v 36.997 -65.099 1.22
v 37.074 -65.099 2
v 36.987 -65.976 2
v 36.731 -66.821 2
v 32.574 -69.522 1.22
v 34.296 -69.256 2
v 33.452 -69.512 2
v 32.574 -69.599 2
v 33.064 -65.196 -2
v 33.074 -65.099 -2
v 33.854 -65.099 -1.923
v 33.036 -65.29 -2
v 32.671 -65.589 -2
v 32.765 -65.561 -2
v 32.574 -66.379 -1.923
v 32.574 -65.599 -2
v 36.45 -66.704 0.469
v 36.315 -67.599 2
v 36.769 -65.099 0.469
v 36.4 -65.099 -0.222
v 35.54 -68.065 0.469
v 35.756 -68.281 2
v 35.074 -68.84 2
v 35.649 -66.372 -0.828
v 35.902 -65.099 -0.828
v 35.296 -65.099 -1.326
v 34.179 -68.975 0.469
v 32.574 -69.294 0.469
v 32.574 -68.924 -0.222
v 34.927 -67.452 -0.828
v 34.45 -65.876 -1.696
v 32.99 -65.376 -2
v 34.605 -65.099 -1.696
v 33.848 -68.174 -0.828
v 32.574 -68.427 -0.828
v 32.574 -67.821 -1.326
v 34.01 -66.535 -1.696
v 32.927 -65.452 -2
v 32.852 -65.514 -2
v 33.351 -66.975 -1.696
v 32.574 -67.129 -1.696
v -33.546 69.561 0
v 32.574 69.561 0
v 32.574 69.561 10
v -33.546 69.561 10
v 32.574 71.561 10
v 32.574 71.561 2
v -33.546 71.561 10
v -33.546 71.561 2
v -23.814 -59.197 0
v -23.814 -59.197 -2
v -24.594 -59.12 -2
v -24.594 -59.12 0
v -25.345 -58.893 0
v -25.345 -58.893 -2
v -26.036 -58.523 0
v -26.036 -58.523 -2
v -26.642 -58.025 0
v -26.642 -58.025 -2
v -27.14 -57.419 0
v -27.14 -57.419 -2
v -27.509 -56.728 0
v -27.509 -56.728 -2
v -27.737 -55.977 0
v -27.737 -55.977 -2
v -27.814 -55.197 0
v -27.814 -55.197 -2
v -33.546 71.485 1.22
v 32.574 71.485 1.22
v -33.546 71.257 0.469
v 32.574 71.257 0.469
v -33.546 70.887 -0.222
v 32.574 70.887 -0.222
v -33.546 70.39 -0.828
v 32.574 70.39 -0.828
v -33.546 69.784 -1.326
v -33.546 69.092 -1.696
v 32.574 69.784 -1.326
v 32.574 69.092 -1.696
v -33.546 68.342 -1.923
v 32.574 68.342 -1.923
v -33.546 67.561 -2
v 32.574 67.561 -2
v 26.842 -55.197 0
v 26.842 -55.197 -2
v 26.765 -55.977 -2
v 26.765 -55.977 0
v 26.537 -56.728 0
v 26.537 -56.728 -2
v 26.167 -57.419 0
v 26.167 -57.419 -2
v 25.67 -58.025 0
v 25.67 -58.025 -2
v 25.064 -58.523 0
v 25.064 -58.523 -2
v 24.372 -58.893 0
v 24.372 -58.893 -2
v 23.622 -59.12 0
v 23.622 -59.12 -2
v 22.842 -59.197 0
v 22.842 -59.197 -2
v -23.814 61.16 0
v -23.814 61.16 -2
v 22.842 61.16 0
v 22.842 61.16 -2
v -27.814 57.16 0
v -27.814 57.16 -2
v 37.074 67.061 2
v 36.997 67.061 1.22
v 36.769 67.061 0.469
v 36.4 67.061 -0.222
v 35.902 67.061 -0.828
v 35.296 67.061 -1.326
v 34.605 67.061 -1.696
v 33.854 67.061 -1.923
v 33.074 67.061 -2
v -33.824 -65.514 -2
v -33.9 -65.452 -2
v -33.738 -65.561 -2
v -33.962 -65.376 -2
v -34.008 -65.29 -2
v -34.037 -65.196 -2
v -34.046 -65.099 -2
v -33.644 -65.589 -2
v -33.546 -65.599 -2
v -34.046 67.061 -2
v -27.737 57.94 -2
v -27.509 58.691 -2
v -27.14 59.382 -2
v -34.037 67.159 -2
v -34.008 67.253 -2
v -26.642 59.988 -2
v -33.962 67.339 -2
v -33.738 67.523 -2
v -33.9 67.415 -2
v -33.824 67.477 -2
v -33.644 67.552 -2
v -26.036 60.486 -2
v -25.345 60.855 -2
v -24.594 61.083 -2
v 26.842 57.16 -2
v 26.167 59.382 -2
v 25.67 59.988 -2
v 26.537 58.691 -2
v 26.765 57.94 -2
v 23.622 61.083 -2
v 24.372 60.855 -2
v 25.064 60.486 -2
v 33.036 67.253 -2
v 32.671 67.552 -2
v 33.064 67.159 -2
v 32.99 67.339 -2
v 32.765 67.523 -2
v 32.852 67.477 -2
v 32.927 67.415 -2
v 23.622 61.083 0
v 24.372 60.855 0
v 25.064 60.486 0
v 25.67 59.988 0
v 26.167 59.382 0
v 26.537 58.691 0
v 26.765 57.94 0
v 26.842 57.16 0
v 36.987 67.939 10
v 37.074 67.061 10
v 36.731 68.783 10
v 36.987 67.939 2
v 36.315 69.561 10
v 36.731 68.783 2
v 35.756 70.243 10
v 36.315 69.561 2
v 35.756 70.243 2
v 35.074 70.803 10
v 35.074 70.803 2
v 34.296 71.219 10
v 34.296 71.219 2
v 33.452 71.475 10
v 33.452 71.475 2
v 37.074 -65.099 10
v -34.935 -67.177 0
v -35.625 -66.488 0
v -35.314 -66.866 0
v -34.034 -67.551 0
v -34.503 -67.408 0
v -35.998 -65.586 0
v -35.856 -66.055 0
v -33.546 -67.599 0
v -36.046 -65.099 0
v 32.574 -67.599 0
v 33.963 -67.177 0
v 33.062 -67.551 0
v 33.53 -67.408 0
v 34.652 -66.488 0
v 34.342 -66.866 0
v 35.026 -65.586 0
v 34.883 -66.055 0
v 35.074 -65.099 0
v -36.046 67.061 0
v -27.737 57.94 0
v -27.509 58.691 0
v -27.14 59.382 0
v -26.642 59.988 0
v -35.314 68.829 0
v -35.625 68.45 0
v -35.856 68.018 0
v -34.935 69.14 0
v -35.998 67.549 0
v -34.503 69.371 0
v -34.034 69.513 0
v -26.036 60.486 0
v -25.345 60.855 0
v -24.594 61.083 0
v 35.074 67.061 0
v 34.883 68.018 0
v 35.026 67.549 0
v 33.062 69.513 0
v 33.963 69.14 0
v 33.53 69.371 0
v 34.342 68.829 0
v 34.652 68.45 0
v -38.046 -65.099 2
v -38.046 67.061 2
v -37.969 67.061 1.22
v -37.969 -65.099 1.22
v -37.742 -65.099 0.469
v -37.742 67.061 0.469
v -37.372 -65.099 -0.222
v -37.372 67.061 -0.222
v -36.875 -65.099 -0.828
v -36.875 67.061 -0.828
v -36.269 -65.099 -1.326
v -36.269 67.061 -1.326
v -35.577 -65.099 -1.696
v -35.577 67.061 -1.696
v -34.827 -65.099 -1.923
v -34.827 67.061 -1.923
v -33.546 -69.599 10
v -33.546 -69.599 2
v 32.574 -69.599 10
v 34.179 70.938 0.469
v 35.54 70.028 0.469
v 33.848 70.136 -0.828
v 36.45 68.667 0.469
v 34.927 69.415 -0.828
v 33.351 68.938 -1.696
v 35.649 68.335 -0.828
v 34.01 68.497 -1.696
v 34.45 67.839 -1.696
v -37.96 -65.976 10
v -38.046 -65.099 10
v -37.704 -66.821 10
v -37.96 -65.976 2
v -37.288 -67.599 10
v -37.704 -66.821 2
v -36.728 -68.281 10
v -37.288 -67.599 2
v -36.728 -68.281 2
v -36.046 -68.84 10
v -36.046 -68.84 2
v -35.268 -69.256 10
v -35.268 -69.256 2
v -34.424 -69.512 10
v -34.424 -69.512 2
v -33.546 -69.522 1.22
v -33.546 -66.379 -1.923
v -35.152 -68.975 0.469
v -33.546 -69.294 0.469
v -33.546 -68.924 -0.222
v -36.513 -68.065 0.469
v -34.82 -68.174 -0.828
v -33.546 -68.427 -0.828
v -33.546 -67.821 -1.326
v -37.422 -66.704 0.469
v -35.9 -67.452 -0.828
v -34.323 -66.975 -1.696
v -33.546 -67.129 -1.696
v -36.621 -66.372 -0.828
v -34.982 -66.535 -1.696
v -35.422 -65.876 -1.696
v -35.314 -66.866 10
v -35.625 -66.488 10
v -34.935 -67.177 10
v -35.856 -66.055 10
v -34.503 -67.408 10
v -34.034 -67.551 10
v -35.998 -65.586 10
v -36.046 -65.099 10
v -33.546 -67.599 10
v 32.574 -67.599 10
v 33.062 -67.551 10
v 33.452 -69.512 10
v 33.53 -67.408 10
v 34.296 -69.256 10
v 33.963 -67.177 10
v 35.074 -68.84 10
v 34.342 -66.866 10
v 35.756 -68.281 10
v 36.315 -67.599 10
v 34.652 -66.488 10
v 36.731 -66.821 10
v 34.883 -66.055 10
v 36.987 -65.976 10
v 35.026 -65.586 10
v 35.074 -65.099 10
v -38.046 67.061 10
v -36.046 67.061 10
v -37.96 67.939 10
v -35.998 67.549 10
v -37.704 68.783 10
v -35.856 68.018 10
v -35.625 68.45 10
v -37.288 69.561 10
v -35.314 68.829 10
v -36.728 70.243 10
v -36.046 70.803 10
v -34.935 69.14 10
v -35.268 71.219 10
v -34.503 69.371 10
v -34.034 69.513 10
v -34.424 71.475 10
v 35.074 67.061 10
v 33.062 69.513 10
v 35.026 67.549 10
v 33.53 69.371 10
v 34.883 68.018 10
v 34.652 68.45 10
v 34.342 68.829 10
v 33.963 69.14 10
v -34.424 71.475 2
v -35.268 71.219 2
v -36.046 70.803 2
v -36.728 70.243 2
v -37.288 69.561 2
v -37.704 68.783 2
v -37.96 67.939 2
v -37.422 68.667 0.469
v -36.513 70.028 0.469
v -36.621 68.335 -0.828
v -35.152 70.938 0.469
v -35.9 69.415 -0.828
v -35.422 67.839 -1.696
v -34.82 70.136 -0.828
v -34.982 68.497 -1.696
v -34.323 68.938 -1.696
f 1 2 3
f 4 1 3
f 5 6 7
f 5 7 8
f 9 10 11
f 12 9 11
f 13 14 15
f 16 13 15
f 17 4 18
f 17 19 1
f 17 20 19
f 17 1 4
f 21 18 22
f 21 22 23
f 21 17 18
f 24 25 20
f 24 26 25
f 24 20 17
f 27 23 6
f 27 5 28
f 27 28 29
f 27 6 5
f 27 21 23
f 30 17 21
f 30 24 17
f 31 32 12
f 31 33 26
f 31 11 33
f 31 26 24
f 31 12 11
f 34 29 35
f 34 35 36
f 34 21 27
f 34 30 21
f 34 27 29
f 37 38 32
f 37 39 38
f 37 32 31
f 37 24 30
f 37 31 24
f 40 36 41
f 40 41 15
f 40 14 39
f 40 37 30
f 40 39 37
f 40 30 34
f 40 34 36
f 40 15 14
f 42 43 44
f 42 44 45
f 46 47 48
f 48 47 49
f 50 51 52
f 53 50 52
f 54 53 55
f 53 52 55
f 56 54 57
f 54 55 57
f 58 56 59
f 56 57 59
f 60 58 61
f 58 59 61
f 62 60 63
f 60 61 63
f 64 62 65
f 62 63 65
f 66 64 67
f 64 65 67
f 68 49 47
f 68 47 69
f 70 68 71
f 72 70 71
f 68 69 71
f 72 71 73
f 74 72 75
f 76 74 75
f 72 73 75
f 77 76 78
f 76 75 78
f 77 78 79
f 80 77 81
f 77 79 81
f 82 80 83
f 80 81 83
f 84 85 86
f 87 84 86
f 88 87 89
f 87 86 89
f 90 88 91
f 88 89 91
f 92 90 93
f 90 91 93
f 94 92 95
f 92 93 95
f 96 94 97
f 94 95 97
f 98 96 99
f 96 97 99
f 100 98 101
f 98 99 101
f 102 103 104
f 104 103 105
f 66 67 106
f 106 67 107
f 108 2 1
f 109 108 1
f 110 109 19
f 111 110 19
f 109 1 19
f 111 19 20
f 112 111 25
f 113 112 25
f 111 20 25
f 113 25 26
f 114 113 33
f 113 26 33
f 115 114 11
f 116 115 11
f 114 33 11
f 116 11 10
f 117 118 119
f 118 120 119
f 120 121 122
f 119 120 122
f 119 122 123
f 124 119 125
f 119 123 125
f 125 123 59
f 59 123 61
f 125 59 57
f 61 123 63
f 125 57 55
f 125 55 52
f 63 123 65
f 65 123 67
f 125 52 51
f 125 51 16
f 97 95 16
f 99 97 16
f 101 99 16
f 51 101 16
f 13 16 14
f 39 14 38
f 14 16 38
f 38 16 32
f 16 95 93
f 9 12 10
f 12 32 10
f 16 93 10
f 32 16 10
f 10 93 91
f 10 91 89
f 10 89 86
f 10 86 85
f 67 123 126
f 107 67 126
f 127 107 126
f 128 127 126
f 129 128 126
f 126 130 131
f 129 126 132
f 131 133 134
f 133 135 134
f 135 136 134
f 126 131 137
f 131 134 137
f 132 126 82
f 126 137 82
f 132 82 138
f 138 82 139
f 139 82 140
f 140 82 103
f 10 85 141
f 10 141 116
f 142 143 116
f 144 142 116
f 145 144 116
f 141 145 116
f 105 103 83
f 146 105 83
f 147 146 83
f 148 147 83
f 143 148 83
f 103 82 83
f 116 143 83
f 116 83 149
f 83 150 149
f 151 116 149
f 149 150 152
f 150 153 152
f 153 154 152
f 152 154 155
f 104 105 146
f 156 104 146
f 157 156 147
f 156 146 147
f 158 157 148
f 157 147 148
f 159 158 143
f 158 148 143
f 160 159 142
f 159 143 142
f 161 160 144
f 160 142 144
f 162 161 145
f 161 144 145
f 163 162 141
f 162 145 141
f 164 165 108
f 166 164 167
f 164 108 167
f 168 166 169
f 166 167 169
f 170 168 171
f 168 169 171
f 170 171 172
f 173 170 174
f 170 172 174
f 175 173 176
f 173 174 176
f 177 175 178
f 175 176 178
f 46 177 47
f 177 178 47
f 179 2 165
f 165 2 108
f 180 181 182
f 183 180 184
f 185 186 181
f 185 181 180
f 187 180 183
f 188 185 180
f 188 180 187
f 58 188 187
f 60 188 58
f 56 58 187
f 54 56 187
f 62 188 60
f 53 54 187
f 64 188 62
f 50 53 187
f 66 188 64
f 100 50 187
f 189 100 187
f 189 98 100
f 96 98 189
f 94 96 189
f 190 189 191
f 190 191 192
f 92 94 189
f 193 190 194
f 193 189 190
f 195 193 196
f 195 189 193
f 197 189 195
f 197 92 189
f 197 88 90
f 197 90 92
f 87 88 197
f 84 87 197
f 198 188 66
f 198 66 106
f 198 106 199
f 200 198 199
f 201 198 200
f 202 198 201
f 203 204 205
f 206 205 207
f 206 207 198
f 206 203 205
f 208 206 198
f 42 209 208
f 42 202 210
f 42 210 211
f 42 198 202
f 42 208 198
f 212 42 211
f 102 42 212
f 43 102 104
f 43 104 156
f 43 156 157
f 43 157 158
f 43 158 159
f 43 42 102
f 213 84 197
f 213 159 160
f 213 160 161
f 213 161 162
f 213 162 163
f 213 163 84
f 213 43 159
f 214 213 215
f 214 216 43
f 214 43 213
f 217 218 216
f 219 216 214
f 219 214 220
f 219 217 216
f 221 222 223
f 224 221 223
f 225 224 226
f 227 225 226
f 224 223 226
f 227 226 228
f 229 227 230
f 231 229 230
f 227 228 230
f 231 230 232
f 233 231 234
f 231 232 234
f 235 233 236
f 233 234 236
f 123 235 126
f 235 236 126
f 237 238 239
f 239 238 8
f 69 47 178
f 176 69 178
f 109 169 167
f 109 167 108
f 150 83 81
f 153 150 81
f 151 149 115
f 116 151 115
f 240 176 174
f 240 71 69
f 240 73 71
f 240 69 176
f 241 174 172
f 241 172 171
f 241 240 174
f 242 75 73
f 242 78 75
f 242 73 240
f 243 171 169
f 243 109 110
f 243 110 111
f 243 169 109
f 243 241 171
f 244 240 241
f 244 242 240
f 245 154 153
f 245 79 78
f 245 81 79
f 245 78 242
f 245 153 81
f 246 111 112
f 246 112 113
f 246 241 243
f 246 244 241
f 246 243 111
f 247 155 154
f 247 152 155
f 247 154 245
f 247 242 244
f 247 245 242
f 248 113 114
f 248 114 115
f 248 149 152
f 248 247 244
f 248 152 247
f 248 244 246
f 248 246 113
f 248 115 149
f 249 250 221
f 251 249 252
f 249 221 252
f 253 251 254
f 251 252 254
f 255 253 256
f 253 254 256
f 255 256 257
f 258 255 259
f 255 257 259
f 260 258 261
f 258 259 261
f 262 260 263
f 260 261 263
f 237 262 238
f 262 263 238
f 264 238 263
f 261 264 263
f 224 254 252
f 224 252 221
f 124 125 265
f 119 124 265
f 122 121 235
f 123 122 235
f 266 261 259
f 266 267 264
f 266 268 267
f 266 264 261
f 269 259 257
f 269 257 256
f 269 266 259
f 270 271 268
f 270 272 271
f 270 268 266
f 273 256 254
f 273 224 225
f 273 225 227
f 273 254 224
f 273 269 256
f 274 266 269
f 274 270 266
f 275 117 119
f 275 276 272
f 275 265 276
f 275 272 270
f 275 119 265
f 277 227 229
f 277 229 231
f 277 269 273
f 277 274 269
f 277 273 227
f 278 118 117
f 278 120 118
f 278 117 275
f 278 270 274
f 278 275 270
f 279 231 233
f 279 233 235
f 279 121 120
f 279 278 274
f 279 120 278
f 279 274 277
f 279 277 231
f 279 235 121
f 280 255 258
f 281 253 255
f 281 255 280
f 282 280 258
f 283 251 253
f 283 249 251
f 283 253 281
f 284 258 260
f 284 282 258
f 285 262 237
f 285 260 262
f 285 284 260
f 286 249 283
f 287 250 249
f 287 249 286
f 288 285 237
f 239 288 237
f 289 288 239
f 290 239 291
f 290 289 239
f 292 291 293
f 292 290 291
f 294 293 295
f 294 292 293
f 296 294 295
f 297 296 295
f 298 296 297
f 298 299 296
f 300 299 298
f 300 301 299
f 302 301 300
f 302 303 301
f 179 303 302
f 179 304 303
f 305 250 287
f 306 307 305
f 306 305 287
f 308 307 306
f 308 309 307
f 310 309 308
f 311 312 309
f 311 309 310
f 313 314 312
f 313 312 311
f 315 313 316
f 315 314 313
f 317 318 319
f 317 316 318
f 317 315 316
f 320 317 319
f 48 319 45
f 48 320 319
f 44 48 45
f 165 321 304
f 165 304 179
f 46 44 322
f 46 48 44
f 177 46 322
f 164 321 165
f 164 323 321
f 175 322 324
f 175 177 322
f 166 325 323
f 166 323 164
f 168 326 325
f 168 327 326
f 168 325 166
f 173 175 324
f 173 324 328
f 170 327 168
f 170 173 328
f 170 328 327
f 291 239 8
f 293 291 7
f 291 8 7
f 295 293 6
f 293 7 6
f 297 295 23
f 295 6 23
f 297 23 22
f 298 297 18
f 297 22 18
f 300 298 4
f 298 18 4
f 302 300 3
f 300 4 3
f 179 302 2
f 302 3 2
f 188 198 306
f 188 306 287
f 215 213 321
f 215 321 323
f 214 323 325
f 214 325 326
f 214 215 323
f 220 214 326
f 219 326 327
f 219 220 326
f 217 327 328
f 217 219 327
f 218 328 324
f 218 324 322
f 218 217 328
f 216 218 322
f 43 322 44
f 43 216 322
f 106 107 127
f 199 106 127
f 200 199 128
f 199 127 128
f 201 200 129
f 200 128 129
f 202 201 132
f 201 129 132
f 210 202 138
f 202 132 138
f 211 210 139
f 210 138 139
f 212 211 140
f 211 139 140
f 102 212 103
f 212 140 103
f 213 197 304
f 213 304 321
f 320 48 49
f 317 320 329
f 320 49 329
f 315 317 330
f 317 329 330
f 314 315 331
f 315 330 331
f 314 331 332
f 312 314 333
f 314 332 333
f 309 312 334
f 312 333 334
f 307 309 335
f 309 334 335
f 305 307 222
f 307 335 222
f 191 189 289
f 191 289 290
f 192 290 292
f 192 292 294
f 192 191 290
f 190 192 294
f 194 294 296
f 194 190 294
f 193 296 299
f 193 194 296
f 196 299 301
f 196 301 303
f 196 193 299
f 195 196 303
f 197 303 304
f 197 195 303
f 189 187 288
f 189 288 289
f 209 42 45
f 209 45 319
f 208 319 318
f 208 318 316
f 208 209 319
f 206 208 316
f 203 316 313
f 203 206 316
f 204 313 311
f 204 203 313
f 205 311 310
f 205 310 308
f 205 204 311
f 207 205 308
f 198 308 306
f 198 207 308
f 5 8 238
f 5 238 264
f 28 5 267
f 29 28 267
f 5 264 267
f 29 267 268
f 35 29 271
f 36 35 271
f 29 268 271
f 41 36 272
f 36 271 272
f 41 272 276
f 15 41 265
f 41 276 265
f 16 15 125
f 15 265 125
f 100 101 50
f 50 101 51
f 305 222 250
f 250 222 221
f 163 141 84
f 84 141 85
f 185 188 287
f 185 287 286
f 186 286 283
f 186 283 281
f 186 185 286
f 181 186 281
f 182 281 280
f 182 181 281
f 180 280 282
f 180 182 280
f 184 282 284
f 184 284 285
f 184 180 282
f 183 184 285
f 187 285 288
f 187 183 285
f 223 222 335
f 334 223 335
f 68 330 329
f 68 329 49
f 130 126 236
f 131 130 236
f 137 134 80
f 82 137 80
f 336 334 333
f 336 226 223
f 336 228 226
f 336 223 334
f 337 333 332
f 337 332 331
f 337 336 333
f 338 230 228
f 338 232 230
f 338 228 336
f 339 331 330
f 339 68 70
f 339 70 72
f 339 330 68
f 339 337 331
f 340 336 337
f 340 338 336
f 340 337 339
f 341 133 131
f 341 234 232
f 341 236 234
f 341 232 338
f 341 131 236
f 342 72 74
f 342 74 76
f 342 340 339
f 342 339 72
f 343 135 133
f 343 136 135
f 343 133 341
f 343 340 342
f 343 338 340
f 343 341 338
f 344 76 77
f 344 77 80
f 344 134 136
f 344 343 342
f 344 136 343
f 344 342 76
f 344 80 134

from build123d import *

# Parameters (mm, degrees)
BOSS_EXTRU_1_DEPTH      = 10
COQUE1_T                = 2
CONG_1_R                = 4
ENL_V_MAT_EXTRU_1_DEPTH = 10


with BuildPart() as part:
    # Esquisse1 → Boss.-Extru.1 (new body)
    with BuildSketch(Plane.XY):
        with BuildLine():
            Line((-33.546223224, -67.598576794), (32.573776776, -67.598576794))
            ThreePointArc((32.573776776, -67.598576794), (34.341543729, -66.866343747), (35.073776776, -65.098576794))
            Line((35.073776776, -65.098576794), (35.073776776, 67.061423206))
            ThreePointArc((35.073776776, 67.061423206), (34.341543729, 68.829190159), (32.573776776, 69.561423206))
            Line((32.573776776, 69.561423206), (-33.546223224, 69.561423206))
            ThreePointArc((-33.546223224, 69.561423206), (-35.313990177, 68.829190159), (-36.046223224, 67.061423206))
            Line((-36.046223224, 67.061423206), (-36.046223224, -65.098576794))
            ThreePointArc((-36.046223224, -65.098576794), (-35.313990177, -66.866343747), (-33.546223224, -67.598576794))
        make_face()
    extrude(amount=BOSS_EXTRU_1_DEPTH)

    # Coque1
    coque1_openings = [part.faces().sort_by_distance(p)[0] for p in [
        (-0.486223224, 0.981423206, 10),
    ]]
    offset(amount=COQUE1_T, openings=coque1_openings, kind=Kind.INTERSECTION)

    # Congé1
    # the kernel refuses this fillet: 4 mm, written as the material it takes off along each edge
    with BuildSketch(Plane(origin=(32.573776776, 71.561423206, -2), x_dir=(0, 0, 1), z_dir=(-1, 0, 0)), Plane(origin=(-33.546223224, -69.598576794, -2), x_dir=(0, 0, 1), z_dir=(1, 0, 0))) as cong_1_piece_1:
        with BuildLine():
            CenterArc((CONG_1_R, -CONG_1_R), CONG_1_R, 90, 90)
            Line((0, -CONG_1_R), (0, 0))
            Line((0, 0), (CONG_1_R, 0))
        make_face()
    extrude(amount=66.12, mode=Mode.SUBTRACT)
    with BuildSketch(Plane(origin=(32.573776776, 67.061423206, -2), x_dir=(0, 1, 0), z_dir=(-1, 0, 0))) as cong_1_piece_2:
        with BuildLine():
            CenterArc((4.5 - CONG_1_R, -CONG_1_R), CONG_1_R, 0, 90)
            Line((4.5 - CONG_1_R, 0), (4.5, 0))
            Line((4.5, 0), (4.5, -CONG_1_R))
        make_face()
    revolve(axis=Axis((32.573776776, 67.061423206, -2), (0, 0, -1)), revolution_arc=90, mode=Mode.SUBTRACT)
    with BuildSketch(Plane(origin=(37.073776776, -65.098576794, -2), x_dir=(0, 0, 1), z_dir=(0, 1, 0)), Plane(origin=(-38.046223224, 67.061423206, -2), x_dir=(0, 0, 1), z_dir=(0, -1, 0))) as cong_1_piece_3:
        with BuildLine():
            CenterArc((CONG_1_R, -CONG_1_R), CONG_1_R, 90, 90)
            Line((0, -CONG_1_R), (0, 0))
            Line((0, 0), (CONG_1_R, 0))
        make_face()
    extrude(amount=132.16, mode=Mode.SUBTRACT)
    with BuildSketch(Plane(origin=(32.573776776, -65.098576794, -2), x_dir=(1, 0, 0), z_dir=(0, 1, 0))) as cong_1_piece_4:
        with BuildLine():
            CenterArc((4.5 - CONG_1_R, -CONG_1_R), CONG_1_R, 0, 90)
            Line((4.5 - CONG_1_R, 0), (4.5, 0))
            Line((4.5, 0), (4.5, -CONG_1_R))
        make_face()
    revolve(axis=Axis((32.573776776, -65.098576794, -2), (0, 0, -1)), revolution_arc=90, mode=Mode.SUBTRACT)
    with BuildSketch(Plane(origin=(-33.546223224, -65.098576794, -2), x_dir=(0, -1, 0), z_dir=(1, 0, 0))) as cong_1_piece_5:
        with BuildLine():
            CenterArc((4.5 - CONG_1_R, -CONG_1_R), CONG_1_R, 0, 90)
            Line((4.5 - CONG_1_R, 0), (4.5, 0))
            Line((4.5, 0), (4.5, -CONG_1_R))
        make_face()
    revolve(axis=Axis((-33.546223224, -65.098576794, -2), (0, 0, -1)), revolution_arc=90, mode=Mode.SUBTRACT)
    with BuildSketch(Plane(origin=(-33.546223224, 67.061423206, -2), x_dir=(-1, 0, 0), z_dir=(0, -1, 0))) as cong_1_piece_6:
        with BuildLine():
            CenterArc((4.5 - CONG_1_R, -CONG_1_R), CONG_1_R, 0, 90)
            Line((4.5 - CONG_1_R, 0), (4.5, 0))
            Line((4.5, 0), (4.5, -CONG_1_R))
        make_face()
    revolve(axis=Axis((-33.546223224, 67.061423206, -2), (0, 0, -1)), revolution_arc=90, mode=Mode.SUBTRACT)

    # Esquisse2 → Enlèv. mat.-Extru.1 (cut)
    with BuildSketch(Plane(origin=(0, 0, -2), x_dir=(-1, 0, 0), z_dir=(0, 0, -1))):
        with BuildLine():
            Line((-22.841530632, -59.197056867), (23.81397708, -59.197056867))
            ThreePointArc((23.81397708, -59.197056867), (26.642404205, -58.025483992), (27.81397708, -55.197056867))
            Line((27.81397708, -55.197056867), (27.81397708, 57.159903279))
            ThreePointArc((27.81397708, 57.159903279), (26.642404205, 59.988330404), (23.81397708, 61.159903279))
            Line((23.81397708, 61.159903279), (-22.841530632, 61.159903279))
            ThreePointArc((-22.841530632, 61.159903279), (-25.669957756, 59.988330404), (-26.841530632, 57.159903279))
            Line((-26.841530632, 57.159903279), (-26.841530632, -55.197056867))
            ThreePointArc((-26.841530632, -55.197056867), (-25.669957756, -58.025483992), (-22.841530632, -59.197056867))
        make_face()
    extrude(amount=-ENL_V_MAT_EXTRU_1_DEPTH, mode=Mode.SUBTRACT)


solid = part.part
